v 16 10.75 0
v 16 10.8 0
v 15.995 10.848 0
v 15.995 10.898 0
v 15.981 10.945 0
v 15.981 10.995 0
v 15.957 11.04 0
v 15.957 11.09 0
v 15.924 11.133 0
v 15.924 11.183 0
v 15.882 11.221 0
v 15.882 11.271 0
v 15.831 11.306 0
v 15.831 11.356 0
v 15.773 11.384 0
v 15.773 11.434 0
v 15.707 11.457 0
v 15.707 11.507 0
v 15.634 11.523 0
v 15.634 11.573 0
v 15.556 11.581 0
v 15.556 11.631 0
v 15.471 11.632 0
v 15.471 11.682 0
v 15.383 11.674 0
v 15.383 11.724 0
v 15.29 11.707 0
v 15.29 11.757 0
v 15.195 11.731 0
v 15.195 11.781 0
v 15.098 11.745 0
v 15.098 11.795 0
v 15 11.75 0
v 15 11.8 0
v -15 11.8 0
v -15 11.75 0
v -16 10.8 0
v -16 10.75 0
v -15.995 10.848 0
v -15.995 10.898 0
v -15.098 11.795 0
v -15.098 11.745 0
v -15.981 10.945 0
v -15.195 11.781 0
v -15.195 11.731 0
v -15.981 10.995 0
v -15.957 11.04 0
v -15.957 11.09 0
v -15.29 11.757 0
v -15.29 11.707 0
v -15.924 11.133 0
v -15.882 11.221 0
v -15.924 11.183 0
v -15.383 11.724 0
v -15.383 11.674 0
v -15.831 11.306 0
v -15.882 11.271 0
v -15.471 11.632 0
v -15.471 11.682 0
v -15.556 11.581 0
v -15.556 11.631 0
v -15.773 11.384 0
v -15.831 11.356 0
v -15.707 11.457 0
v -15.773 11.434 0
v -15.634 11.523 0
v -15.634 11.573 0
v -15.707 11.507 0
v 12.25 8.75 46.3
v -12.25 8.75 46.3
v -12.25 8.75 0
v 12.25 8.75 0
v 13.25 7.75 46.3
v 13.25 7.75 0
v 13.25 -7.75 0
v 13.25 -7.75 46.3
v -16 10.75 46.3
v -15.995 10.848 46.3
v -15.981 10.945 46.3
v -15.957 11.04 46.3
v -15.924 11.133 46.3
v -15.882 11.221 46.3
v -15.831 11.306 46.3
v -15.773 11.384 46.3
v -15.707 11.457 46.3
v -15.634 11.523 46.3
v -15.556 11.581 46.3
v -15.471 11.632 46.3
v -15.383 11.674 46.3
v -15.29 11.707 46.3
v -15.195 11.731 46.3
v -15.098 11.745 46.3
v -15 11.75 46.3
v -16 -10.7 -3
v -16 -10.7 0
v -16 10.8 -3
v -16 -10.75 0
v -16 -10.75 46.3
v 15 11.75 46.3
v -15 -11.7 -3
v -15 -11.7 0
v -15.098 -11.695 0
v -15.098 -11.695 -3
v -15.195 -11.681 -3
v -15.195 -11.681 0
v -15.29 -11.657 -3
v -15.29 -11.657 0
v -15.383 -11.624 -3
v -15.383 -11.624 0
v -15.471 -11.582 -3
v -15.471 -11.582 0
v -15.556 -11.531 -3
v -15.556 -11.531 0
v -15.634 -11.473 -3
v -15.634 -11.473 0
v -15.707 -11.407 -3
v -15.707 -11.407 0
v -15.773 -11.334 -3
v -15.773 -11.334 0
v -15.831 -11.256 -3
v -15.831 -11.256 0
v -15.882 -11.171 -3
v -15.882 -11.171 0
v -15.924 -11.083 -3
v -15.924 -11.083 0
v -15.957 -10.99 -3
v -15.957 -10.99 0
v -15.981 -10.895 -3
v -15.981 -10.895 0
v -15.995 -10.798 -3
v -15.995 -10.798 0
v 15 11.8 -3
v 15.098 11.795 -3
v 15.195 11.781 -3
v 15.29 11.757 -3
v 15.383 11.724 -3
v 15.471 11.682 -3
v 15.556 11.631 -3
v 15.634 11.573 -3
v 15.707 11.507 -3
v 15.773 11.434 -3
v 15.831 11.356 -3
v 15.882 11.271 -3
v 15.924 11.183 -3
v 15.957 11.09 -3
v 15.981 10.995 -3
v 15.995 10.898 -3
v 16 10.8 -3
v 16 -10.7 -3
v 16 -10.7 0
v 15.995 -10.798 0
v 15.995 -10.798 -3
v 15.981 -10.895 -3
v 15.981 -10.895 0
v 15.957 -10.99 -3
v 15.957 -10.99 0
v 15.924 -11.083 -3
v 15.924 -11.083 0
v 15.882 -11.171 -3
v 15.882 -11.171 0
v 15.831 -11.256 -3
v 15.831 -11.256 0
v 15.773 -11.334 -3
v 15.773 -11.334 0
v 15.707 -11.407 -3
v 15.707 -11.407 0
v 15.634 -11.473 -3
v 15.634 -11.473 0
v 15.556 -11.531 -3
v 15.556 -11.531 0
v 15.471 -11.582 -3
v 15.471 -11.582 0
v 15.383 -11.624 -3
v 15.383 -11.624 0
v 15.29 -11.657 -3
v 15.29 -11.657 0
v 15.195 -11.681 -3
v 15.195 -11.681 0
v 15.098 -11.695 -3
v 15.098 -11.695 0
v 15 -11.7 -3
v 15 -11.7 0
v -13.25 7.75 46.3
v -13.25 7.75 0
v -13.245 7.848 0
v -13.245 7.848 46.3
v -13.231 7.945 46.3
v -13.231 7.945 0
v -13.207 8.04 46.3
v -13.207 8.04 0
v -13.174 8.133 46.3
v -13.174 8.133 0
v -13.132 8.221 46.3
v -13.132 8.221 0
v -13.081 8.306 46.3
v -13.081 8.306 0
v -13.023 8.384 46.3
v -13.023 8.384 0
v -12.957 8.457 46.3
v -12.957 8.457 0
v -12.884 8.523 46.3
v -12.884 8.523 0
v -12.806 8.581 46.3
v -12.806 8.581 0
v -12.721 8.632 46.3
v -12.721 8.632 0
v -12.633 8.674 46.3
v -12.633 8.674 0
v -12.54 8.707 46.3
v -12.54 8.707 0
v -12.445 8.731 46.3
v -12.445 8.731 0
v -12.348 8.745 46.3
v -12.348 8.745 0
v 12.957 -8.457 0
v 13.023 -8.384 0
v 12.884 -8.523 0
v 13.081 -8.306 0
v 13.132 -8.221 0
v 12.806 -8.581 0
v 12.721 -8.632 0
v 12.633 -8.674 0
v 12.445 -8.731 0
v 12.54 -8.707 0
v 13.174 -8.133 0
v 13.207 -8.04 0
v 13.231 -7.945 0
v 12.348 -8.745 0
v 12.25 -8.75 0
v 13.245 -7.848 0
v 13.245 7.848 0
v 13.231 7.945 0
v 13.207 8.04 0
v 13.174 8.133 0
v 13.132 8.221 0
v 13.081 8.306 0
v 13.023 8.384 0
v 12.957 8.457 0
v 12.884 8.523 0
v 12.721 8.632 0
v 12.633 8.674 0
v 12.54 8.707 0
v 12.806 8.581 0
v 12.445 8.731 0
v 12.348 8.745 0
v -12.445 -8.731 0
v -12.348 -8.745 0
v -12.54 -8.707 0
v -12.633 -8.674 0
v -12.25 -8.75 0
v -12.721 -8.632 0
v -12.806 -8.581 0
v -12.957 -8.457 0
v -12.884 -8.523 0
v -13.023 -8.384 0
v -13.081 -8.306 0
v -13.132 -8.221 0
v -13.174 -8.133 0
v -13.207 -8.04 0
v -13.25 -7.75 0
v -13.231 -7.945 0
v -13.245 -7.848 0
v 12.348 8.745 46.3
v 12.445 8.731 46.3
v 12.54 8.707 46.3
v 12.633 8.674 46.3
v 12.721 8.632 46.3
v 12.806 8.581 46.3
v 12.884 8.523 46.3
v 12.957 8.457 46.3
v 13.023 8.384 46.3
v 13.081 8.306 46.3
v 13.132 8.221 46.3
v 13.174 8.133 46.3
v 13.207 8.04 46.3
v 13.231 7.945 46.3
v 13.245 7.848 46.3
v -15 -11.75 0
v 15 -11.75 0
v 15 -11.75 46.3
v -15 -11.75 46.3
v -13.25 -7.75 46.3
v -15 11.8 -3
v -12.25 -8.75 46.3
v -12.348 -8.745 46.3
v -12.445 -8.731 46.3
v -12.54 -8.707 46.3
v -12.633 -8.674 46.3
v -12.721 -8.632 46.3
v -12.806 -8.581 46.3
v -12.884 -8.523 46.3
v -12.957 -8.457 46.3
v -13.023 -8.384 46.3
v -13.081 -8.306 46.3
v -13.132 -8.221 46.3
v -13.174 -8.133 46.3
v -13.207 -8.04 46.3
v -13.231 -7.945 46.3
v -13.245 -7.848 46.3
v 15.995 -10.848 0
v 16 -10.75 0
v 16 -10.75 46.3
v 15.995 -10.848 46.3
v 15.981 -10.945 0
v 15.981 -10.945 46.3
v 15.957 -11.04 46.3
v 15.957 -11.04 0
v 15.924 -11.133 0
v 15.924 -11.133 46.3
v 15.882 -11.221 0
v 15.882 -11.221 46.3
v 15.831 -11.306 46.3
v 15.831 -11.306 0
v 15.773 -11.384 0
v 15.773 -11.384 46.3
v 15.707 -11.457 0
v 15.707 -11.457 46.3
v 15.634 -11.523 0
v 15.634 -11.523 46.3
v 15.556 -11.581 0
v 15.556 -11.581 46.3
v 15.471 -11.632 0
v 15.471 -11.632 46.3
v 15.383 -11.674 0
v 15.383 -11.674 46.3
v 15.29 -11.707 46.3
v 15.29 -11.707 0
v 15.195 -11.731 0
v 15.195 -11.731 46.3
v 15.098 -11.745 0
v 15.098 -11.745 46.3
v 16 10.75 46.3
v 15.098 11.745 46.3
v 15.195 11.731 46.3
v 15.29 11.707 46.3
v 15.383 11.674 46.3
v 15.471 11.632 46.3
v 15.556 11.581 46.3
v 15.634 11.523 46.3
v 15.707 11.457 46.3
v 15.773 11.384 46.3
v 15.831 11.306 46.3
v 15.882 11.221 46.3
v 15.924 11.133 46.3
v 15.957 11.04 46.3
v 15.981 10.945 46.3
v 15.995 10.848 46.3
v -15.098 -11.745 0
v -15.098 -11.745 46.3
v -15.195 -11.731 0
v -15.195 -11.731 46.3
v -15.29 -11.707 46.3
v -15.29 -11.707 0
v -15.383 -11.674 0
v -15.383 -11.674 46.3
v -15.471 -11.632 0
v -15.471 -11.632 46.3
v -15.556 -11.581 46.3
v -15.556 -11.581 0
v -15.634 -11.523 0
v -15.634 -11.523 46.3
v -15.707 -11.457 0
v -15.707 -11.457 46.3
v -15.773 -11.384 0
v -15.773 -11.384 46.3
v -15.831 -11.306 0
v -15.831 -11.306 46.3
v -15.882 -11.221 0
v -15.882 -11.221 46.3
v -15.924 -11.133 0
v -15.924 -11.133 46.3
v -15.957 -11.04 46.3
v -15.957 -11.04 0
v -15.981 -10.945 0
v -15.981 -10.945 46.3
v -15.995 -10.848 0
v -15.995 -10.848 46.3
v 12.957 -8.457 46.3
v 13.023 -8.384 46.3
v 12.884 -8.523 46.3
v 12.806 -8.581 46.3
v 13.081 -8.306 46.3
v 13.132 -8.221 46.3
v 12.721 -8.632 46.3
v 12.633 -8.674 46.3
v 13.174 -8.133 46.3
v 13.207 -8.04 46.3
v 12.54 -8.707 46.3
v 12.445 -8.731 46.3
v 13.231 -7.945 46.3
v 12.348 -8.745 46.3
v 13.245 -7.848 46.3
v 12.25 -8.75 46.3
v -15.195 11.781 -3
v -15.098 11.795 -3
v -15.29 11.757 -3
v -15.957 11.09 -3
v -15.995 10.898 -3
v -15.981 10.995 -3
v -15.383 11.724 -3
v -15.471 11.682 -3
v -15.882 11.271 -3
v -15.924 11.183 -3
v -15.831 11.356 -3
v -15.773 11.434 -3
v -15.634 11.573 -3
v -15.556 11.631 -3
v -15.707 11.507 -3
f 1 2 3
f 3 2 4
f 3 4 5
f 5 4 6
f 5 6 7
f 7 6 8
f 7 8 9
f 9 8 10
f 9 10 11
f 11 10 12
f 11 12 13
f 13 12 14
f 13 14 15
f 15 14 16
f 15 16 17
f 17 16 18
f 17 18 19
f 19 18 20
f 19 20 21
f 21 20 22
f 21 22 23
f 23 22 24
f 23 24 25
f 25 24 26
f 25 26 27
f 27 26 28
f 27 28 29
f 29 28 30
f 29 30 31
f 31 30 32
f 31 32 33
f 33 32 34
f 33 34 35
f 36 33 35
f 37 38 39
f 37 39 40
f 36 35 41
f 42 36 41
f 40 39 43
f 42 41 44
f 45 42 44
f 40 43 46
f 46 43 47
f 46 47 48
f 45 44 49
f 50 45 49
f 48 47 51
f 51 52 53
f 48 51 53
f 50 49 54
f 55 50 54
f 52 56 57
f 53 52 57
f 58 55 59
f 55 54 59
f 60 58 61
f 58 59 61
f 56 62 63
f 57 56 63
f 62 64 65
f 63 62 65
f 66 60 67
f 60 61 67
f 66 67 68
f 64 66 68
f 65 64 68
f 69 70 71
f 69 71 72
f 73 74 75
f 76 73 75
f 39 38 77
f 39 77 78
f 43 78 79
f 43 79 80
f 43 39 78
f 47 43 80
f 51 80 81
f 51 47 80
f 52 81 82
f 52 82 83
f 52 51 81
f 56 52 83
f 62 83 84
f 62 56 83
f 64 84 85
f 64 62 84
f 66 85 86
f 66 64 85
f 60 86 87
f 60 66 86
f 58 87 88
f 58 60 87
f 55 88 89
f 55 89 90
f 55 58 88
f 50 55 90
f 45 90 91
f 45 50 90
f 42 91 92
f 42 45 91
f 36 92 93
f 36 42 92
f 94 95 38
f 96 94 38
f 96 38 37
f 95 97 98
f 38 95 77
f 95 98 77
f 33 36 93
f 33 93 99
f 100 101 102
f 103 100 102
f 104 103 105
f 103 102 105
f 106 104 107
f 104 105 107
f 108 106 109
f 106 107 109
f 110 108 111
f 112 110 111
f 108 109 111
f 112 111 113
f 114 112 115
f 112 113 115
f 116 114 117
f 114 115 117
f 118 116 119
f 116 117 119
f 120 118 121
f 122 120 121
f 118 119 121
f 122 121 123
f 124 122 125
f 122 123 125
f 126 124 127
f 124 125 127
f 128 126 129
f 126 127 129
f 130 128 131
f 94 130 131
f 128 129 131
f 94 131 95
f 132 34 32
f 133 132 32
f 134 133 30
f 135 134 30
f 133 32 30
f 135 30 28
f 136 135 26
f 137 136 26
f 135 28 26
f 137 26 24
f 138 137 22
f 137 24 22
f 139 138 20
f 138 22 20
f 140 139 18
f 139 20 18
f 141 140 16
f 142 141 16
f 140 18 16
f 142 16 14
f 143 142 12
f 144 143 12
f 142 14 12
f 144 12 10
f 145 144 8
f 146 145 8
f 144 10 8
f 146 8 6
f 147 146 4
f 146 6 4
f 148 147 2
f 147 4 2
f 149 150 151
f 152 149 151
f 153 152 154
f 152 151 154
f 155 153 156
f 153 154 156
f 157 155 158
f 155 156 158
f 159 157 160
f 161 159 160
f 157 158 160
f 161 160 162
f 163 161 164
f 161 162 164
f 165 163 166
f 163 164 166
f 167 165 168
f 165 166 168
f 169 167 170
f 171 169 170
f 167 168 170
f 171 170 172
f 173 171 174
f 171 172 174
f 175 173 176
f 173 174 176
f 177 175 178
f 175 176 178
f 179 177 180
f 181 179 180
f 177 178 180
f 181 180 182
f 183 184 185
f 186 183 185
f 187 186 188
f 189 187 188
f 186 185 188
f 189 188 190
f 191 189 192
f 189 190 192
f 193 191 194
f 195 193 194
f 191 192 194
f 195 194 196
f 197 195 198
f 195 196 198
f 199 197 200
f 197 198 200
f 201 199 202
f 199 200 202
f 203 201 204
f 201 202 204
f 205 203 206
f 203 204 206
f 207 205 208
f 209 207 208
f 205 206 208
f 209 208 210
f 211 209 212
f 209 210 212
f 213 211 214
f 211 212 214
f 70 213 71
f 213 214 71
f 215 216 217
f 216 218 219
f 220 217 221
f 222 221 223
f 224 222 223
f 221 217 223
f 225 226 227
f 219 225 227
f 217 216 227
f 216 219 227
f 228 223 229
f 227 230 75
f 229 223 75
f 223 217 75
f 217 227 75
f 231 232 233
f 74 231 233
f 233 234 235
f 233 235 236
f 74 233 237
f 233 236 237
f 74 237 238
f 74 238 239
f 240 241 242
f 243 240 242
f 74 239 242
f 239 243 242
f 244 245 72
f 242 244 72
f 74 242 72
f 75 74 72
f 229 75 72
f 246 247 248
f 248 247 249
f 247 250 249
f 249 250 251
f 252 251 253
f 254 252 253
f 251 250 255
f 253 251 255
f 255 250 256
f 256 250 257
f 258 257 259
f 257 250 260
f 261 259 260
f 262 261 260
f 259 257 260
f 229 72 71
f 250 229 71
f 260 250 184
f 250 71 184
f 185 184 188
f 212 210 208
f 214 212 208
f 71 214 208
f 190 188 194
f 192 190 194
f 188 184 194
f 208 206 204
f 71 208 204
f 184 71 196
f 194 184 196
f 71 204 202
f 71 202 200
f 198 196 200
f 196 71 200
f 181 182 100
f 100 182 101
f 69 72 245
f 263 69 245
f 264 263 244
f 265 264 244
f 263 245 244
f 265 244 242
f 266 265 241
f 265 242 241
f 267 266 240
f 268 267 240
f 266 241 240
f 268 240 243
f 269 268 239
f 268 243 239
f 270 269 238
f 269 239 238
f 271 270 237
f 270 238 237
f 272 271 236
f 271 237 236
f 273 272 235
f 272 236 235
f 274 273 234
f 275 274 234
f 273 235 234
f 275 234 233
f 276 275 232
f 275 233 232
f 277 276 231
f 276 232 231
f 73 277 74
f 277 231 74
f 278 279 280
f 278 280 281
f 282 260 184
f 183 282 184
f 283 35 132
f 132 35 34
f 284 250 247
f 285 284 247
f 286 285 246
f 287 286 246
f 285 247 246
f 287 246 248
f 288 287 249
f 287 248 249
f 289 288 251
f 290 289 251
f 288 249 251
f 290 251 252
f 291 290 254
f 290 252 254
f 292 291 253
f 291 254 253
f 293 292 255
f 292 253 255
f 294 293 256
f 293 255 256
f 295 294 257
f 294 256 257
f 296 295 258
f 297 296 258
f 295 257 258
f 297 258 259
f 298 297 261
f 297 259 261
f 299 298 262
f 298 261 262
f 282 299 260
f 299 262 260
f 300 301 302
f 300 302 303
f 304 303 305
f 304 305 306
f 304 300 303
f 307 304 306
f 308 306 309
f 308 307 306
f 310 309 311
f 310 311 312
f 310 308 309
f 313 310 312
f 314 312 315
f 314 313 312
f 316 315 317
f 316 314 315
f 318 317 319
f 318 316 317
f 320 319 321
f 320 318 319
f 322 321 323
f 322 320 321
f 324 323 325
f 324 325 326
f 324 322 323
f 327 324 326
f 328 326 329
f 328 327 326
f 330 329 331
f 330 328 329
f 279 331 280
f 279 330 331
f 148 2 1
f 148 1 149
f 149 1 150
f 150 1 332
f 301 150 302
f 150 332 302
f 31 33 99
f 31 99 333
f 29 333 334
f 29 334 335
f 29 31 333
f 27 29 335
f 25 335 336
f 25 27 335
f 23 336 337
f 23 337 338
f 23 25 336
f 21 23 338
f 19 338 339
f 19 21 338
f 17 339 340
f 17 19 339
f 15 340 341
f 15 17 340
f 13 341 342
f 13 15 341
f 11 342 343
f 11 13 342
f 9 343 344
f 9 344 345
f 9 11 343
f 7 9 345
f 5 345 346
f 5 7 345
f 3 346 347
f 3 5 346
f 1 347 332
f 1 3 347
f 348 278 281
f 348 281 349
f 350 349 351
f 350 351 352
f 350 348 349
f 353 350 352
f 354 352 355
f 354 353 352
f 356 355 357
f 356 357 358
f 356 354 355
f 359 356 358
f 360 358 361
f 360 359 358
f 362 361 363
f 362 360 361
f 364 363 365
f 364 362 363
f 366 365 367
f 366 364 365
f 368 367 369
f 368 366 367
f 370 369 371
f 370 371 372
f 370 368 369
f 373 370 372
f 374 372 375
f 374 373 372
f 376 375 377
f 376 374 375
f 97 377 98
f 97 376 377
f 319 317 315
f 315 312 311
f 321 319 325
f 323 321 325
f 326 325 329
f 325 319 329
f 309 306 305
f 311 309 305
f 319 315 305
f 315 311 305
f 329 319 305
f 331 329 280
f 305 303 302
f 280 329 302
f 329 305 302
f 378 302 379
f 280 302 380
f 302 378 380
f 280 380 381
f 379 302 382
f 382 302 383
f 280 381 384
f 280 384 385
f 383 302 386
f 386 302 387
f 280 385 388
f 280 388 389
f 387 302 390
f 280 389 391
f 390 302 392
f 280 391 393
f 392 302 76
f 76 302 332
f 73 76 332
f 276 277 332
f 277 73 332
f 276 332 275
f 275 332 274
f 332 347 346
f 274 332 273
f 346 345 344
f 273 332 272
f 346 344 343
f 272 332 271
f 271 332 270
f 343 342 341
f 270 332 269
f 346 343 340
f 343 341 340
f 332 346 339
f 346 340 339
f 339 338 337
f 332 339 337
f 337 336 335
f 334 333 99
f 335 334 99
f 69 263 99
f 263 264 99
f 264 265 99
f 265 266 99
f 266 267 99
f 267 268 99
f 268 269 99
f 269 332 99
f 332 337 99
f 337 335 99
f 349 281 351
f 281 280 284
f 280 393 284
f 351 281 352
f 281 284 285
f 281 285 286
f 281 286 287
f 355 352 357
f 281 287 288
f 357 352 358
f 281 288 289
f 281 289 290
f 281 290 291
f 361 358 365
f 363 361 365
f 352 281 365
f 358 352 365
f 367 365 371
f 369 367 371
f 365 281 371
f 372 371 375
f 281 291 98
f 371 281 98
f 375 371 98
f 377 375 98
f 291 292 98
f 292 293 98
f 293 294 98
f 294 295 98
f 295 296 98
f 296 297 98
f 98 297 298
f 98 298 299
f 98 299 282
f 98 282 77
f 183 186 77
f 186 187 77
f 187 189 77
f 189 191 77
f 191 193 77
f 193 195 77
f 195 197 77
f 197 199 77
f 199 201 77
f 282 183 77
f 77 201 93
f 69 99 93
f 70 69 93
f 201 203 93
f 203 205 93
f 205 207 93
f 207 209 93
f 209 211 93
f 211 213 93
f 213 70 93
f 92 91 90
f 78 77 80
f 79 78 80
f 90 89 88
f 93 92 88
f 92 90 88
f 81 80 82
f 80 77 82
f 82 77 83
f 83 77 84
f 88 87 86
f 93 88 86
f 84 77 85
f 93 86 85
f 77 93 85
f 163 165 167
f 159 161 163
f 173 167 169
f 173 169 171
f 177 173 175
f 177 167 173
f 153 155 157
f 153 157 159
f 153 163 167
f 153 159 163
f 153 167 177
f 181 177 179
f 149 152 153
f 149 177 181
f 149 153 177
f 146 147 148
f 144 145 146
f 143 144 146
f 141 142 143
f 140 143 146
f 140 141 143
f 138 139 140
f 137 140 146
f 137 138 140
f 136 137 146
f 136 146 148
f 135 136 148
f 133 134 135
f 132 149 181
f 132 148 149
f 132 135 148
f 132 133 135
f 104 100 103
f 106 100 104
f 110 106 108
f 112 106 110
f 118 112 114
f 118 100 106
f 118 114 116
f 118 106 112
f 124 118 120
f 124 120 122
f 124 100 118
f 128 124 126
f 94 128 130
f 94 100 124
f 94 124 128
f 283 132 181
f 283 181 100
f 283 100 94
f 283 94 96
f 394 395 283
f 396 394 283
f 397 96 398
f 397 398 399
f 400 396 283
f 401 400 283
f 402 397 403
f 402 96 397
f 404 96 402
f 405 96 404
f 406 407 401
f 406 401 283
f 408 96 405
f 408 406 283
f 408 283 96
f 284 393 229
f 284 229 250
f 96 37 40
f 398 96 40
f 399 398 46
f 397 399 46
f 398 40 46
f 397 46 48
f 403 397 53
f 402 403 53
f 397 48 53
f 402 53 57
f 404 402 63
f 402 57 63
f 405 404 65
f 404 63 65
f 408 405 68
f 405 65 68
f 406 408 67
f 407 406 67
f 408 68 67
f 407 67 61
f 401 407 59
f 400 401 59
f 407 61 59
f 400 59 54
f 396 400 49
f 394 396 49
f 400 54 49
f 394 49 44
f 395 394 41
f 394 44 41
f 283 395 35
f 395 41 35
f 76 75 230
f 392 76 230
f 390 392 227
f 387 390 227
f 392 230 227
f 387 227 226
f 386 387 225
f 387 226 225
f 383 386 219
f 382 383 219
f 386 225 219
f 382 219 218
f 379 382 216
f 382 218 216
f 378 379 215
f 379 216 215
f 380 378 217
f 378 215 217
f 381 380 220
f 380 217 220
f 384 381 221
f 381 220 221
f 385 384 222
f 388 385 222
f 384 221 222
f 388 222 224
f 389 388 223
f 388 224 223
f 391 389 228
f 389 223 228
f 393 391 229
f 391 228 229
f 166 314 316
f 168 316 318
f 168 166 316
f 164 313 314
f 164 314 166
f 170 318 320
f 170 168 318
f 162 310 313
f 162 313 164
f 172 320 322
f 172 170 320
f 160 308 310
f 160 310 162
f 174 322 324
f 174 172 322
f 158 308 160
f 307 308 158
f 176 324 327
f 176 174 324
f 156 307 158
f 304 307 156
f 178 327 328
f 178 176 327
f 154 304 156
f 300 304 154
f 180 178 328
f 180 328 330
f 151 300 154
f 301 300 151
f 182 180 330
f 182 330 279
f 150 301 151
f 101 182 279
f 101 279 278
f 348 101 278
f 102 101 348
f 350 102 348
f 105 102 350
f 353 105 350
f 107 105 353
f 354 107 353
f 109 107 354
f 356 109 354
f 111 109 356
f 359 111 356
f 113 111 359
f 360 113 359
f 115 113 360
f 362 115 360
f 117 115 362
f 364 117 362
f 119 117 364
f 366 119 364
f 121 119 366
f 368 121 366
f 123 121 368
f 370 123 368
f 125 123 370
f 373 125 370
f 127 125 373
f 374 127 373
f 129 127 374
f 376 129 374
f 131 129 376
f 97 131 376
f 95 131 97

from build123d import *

# Parameters (mm, degrees)
BOSS_EXTRUDE1_DEPTH = 46.3
BOSS_EXTRUDE2_DEPTH = 3


with BuildPart() as part:
    # Sketch1 → Boss-Extrude1 (new body)
    with BuildSketch(Plane.XY):
        with BuildLine():
            Line((-15, 11.75), (15, 11.75))
            ThreePointArc((15, 11.75), (15.707106781, 11.457106781), (16, 10.75))
            Line((16, 10.75), (16, -10.75))
            ThreePointArc((16, -10.75), (15.707106781, -11.457106781), (15, -11.75))
            Line((15, -11.75), (-15, -11.75))
            ThreePointArc((-15, -11.75), (-15.707106781, -11.457106781), (-16, -10.75))
            Line((-16, -10.75), (-16, 10.75))
            ThreePointArc((-16, 10.75), (-15.707106781, 11.457106781), (-15, 11.75))
        make_face()
        with BuildLine():
            Line((-12.25, 8.75), (12.25, 8.75))
            ThreePointArc((12.25, 8.75), (12.957106781, 8.457106781), (13.25, 7.75))
            Line((13.25, 7.75), (13.25, -7.75))
            ThreePointArc((13.25, -7.75), (12.957106781, -8.457106781), (12.25, -8.75))
            Line((12.25, -8.75), (-12.25, -8.75))
            ThreePointArc((-12.25, -8.75), (-12.957106781, -8.457106781), (-13.25, -7.75))
            Line((-13.25, -7.75), (-13.25, 7.75))
            ThreePointArc((-13.25, 7.75), (-12.957106781, 8.457106781), (-12.25, 8.75))
        make_face(mode=Mode.SUBTRACT)
    extrude(amount=BOSS_EXTRUDE1_DEPTH)

    # Sketch3 → Boss-Extrude2 (add)
    with BuildSketch(Plane.XY):
        with BuildLine():
            Line((-15, 11.8), (15, 11.8))
            ThreePointArc((15, 11.8), (15.707106781, 11.507106781), (16, 10.8))
            Line((16, 10.8), (16, -10.7))
            ThreePointArc((16, -10.7), (15.707106781, -11.407106781), (15, -11.7))
            Line((15, -11.7), (-15, -11.7))
            ThreePointArc((-15, -11.7), (-15.707106781, -11.407106781), (-16, -10.7))
            Line((-16, -10.7), (-16, 10.8))
            ThreePointArc((-16, 10.8), (-15.707106781, 11.507106781), (-15, 11.8))
        make_face()
    extrude(amount=-BOSS_EXTRUDE2_DEPTH)


solid = part.part
